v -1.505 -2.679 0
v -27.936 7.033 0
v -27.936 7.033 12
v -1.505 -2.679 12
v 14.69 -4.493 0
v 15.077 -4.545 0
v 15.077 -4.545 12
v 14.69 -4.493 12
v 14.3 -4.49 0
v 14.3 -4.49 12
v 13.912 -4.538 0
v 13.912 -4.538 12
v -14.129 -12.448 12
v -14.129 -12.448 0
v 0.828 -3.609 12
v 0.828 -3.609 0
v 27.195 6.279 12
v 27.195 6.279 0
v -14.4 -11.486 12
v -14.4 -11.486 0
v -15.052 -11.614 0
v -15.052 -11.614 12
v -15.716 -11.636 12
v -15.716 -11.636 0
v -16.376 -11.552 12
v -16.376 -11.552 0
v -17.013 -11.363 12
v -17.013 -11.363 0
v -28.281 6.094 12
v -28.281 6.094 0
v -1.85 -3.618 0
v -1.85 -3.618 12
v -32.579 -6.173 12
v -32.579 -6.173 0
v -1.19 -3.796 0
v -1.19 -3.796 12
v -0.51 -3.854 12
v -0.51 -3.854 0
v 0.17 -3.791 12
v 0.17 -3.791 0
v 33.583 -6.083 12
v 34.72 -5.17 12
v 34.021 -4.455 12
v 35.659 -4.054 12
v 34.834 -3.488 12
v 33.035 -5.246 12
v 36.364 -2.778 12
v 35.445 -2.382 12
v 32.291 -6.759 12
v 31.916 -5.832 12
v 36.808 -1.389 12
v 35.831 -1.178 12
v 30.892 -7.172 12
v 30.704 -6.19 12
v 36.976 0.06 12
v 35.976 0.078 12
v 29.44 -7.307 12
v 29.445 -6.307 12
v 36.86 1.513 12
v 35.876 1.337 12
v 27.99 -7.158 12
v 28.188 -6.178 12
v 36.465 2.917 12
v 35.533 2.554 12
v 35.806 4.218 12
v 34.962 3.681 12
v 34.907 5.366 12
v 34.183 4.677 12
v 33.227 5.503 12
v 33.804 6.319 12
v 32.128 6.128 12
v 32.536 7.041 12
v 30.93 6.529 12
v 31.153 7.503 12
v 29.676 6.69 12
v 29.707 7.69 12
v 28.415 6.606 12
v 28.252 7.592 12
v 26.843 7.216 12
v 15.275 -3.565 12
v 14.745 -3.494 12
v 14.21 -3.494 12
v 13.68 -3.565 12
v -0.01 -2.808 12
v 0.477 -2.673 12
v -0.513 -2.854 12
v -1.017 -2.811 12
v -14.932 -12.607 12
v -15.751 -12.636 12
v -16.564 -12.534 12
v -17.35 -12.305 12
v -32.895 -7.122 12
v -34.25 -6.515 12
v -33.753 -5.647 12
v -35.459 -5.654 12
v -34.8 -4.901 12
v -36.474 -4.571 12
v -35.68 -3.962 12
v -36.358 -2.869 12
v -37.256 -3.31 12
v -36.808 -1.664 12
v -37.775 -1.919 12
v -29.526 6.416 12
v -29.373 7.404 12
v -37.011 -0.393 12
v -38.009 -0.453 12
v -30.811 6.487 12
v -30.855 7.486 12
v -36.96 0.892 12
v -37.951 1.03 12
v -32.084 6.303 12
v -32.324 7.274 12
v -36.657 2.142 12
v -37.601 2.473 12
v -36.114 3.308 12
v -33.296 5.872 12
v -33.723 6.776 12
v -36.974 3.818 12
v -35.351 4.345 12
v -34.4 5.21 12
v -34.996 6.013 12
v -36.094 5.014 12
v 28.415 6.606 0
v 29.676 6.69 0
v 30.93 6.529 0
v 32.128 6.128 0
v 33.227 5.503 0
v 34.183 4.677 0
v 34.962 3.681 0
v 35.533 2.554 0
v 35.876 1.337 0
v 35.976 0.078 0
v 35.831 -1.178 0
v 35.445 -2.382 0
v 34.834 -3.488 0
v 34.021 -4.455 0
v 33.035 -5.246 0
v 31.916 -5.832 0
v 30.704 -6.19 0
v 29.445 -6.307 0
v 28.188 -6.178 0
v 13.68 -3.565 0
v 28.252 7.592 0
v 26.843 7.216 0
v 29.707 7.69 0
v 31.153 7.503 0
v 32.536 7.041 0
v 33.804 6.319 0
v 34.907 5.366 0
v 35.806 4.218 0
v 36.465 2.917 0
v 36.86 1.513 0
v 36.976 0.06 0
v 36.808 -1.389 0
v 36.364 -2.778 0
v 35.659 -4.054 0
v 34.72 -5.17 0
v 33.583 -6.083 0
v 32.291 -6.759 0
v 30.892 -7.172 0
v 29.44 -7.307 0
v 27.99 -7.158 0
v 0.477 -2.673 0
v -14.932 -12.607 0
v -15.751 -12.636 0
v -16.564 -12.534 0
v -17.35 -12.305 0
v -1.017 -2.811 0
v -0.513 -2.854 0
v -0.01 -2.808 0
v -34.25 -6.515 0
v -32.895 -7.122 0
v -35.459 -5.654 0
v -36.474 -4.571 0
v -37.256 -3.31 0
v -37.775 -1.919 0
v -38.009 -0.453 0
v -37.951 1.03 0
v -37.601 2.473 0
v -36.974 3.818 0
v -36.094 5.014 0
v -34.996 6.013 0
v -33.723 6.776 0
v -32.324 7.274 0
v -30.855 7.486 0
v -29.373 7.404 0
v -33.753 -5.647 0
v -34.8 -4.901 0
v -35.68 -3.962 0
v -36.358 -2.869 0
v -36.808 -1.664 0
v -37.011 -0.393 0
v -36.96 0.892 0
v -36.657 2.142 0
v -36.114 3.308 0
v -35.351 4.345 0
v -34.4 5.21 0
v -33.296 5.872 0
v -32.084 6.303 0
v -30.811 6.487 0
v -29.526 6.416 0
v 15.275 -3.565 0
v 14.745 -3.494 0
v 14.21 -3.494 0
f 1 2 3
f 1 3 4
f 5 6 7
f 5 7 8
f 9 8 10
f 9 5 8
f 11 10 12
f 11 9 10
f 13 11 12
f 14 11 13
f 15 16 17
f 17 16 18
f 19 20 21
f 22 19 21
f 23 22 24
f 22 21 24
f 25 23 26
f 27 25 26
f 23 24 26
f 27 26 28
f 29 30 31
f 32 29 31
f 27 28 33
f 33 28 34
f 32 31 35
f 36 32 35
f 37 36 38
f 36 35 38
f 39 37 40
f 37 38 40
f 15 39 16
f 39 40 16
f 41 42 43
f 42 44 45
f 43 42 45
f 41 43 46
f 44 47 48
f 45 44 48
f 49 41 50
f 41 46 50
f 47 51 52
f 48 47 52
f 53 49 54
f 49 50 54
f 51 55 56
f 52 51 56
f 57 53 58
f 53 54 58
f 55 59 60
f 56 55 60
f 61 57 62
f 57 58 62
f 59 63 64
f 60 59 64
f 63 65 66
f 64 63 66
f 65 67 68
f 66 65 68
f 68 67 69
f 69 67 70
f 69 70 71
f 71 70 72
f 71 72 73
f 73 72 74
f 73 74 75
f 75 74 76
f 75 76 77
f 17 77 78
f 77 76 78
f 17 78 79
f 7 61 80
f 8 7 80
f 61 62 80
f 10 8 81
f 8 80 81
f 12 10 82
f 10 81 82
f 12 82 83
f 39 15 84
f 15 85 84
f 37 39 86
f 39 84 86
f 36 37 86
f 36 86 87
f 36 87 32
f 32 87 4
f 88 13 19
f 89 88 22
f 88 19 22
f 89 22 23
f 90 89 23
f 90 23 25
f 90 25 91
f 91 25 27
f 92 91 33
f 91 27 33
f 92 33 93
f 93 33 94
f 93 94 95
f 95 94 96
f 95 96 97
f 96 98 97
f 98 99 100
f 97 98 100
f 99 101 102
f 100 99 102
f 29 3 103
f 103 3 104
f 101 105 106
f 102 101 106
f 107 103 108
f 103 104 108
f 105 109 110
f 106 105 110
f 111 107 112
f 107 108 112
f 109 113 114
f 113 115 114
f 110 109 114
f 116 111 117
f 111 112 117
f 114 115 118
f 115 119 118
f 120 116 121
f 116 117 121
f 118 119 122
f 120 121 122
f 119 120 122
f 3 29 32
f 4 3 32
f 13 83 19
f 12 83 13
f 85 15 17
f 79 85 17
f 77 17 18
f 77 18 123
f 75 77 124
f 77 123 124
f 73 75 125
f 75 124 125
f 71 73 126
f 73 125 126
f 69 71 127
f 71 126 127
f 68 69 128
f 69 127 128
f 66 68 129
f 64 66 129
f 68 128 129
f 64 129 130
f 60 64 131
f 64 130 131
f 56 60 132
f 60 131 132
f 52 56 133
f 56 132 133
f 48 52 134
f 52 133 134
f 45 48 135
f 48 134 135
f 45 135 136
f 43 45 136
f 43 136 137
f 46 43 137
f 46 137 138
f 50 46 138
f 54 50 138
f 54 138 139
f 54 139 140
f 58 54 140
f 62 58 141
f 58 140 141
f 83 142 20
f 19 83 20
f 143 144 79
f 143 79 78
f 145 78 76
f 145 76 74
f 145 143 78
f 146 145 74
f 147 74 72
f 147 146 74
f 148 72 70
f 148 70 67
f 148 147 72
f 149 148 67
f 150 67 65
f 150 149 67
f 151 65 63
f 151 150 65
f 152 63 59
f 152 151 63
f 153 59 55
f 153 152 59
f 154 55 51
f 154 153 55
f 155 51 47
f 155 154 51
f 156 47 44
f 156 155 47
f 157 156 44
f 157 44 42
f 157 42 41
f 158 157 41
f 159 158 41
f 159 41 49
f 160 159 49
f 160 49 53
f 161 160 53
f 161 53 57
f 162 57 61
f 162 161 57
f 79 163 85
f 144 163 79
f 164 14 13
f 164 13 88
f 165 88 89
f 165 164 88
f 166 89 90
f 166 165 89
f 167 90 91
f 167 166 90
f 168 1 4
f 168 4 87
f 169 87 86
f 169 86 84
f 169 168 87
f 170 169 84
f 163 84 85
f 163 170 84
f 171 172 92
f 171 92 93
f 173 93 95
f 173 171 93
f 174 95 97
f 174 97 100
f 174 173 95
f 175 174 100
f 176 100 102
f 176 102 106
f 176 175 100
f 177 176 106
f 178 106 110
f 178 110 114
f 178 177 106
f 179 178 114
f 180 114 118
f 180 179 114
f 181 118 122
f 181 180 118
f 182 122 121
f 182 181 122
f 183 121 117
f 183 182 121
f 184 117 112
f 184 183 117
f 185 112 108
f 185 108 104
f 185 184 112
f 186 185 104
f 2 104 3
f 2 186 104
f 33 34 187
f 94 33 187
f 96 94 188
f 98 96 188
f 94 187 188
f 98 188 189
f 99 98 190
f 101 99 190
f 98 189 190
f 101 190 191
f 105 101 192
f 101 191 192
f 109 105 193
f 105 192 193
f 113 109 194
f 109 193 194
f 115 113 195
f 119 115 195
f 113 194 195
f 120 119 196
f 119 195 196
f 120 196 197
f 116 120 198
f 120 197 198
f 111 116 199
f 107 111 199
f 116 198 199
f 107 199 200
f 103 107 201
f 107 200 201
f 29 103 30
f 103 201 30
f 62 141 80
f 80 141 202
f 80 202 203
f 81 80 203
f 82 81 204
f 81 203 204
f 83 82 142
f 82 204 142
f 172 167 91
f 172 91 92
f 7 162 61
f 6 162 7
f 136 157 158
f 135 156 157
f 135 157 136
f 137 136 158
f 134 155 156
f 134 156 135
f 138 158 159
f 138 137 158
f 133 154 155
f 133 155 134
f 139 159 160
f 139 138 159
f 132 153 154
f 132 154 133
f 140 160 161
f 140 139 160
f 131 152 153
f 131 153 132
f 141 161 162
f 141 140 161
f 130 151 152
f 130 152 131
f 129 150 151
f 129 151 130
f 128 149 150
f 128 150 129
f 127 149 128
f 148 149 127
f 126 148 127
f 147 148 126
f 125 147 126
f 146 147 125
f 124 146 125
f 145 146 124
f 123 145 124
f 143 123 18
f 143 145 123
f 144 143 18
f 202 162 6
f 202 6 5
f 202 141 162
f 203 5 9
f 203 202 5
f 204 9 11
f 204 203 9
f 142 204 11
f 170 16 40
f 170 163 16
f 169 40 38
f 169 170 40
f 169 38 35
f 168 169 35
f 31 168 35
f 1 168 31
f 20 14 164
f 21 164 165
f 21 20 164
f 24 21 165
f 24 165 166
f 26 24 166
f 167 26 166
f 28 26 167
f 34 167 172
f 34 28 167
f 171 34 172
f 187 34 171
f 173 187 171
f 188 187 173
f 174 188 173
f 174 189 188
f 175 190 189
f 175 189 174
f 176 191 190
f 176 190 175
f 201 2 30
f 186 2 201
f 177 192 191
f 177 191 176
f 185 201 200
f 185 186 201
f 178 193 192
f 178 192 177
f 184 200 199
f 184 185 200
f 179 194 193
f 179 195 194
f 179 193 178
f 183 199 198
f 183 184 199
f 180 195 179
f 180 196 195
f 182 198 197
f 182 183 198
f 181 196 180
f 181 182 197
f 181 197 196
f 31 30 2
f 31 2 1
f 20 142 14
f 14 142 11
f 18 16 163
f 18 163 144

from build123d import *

# Parameters (mm, degrees)
BOSS_EXTRUDE1_DEPTH = 12


with BuildPart() as part:
    # Sketch1 → Boss-Extrude1 (new body)
    with BuildSketch(Plane.XY):
        with BuildLine():
            Line((0.477214368, -2.672855337), (26.843355259, 7.215507779))
            ThreePointArc((26.843355259, 7.215507779), (36.953291517, 0.789364626), (27.989636176, -7.157899677))
            Line((27.989636176, -7.157899677), (15.076637928, -4.54511037))
            ThreePointArc((15.076637928, -4.54511037), (14.494851923, -4.485141012), (13.912410709, -4.538371753))
            Line((13.912410709, -4.538371753), (-14.128816251, -12.448152272))
            ThreePointArc((-14.128816251, -12.448152272), (-15.750958715, -12.635893161), (-17.350003272, -12.304759779))
            Line((-17.350003272, -12.304759779), (-32.894889614, -7.121812332))
            ThreePointArc((-32.894889614, -7.121812332), (-37.600806958, 2.472956777), (-27.935809428, 7.032899219))
            Line((-27.935809428, 7.032899219), (-1.504706088, -2.679457675))
            ThreePointArc((-1.504706088, -2.679457675), (-0.513152862, -2.854165557), (0.477214368, -2.672855337))
        make_face()
        with BuildLine():
            Line((-28.280719883, 6.094263625), (-1.849616543, -3.618093269))
            ThreePointArc((-1.849616543, -3.618093269), (-0.509821597, -3.854160008), (0.82837082, -3.609172135))
            Line((0.82837082, -3.609172135), (27.194511712, 6.279190981))
            ThreePointArc((27.194511712, 6.279190981), (35.956456468, 0.709866915), (28.187955173, -6.177762148))
            Line((28.187955173, -6.177762148), (15.274956925, -3.564972841))
            ThreePointArc((15.274956925, -3.564972841), (14.477361985, -3.485090396), (13.679767045, -3.564972841))
            Line((13.679767045, -3.564972841), (-14.400299195, -11.485709022))
            ThreePointArc((-14.400299195, -11.485709022), (-15.71642918, -11.636427946), (-17.012660358, -11.363116652))
            Line((-17.012660358, -11.363116652), (-32.578589422, -6.173153179))
            ThreePointArc((-32.578589422, -6.173153179), (-36.657051163, 2.142313468), (-28.280719883, 6.094263625))
        make_face(mode=Mode.SUBTRACT)
    extrude(amount=BOSS_EXTRUDE1_DEPTH)


solid = part.part
